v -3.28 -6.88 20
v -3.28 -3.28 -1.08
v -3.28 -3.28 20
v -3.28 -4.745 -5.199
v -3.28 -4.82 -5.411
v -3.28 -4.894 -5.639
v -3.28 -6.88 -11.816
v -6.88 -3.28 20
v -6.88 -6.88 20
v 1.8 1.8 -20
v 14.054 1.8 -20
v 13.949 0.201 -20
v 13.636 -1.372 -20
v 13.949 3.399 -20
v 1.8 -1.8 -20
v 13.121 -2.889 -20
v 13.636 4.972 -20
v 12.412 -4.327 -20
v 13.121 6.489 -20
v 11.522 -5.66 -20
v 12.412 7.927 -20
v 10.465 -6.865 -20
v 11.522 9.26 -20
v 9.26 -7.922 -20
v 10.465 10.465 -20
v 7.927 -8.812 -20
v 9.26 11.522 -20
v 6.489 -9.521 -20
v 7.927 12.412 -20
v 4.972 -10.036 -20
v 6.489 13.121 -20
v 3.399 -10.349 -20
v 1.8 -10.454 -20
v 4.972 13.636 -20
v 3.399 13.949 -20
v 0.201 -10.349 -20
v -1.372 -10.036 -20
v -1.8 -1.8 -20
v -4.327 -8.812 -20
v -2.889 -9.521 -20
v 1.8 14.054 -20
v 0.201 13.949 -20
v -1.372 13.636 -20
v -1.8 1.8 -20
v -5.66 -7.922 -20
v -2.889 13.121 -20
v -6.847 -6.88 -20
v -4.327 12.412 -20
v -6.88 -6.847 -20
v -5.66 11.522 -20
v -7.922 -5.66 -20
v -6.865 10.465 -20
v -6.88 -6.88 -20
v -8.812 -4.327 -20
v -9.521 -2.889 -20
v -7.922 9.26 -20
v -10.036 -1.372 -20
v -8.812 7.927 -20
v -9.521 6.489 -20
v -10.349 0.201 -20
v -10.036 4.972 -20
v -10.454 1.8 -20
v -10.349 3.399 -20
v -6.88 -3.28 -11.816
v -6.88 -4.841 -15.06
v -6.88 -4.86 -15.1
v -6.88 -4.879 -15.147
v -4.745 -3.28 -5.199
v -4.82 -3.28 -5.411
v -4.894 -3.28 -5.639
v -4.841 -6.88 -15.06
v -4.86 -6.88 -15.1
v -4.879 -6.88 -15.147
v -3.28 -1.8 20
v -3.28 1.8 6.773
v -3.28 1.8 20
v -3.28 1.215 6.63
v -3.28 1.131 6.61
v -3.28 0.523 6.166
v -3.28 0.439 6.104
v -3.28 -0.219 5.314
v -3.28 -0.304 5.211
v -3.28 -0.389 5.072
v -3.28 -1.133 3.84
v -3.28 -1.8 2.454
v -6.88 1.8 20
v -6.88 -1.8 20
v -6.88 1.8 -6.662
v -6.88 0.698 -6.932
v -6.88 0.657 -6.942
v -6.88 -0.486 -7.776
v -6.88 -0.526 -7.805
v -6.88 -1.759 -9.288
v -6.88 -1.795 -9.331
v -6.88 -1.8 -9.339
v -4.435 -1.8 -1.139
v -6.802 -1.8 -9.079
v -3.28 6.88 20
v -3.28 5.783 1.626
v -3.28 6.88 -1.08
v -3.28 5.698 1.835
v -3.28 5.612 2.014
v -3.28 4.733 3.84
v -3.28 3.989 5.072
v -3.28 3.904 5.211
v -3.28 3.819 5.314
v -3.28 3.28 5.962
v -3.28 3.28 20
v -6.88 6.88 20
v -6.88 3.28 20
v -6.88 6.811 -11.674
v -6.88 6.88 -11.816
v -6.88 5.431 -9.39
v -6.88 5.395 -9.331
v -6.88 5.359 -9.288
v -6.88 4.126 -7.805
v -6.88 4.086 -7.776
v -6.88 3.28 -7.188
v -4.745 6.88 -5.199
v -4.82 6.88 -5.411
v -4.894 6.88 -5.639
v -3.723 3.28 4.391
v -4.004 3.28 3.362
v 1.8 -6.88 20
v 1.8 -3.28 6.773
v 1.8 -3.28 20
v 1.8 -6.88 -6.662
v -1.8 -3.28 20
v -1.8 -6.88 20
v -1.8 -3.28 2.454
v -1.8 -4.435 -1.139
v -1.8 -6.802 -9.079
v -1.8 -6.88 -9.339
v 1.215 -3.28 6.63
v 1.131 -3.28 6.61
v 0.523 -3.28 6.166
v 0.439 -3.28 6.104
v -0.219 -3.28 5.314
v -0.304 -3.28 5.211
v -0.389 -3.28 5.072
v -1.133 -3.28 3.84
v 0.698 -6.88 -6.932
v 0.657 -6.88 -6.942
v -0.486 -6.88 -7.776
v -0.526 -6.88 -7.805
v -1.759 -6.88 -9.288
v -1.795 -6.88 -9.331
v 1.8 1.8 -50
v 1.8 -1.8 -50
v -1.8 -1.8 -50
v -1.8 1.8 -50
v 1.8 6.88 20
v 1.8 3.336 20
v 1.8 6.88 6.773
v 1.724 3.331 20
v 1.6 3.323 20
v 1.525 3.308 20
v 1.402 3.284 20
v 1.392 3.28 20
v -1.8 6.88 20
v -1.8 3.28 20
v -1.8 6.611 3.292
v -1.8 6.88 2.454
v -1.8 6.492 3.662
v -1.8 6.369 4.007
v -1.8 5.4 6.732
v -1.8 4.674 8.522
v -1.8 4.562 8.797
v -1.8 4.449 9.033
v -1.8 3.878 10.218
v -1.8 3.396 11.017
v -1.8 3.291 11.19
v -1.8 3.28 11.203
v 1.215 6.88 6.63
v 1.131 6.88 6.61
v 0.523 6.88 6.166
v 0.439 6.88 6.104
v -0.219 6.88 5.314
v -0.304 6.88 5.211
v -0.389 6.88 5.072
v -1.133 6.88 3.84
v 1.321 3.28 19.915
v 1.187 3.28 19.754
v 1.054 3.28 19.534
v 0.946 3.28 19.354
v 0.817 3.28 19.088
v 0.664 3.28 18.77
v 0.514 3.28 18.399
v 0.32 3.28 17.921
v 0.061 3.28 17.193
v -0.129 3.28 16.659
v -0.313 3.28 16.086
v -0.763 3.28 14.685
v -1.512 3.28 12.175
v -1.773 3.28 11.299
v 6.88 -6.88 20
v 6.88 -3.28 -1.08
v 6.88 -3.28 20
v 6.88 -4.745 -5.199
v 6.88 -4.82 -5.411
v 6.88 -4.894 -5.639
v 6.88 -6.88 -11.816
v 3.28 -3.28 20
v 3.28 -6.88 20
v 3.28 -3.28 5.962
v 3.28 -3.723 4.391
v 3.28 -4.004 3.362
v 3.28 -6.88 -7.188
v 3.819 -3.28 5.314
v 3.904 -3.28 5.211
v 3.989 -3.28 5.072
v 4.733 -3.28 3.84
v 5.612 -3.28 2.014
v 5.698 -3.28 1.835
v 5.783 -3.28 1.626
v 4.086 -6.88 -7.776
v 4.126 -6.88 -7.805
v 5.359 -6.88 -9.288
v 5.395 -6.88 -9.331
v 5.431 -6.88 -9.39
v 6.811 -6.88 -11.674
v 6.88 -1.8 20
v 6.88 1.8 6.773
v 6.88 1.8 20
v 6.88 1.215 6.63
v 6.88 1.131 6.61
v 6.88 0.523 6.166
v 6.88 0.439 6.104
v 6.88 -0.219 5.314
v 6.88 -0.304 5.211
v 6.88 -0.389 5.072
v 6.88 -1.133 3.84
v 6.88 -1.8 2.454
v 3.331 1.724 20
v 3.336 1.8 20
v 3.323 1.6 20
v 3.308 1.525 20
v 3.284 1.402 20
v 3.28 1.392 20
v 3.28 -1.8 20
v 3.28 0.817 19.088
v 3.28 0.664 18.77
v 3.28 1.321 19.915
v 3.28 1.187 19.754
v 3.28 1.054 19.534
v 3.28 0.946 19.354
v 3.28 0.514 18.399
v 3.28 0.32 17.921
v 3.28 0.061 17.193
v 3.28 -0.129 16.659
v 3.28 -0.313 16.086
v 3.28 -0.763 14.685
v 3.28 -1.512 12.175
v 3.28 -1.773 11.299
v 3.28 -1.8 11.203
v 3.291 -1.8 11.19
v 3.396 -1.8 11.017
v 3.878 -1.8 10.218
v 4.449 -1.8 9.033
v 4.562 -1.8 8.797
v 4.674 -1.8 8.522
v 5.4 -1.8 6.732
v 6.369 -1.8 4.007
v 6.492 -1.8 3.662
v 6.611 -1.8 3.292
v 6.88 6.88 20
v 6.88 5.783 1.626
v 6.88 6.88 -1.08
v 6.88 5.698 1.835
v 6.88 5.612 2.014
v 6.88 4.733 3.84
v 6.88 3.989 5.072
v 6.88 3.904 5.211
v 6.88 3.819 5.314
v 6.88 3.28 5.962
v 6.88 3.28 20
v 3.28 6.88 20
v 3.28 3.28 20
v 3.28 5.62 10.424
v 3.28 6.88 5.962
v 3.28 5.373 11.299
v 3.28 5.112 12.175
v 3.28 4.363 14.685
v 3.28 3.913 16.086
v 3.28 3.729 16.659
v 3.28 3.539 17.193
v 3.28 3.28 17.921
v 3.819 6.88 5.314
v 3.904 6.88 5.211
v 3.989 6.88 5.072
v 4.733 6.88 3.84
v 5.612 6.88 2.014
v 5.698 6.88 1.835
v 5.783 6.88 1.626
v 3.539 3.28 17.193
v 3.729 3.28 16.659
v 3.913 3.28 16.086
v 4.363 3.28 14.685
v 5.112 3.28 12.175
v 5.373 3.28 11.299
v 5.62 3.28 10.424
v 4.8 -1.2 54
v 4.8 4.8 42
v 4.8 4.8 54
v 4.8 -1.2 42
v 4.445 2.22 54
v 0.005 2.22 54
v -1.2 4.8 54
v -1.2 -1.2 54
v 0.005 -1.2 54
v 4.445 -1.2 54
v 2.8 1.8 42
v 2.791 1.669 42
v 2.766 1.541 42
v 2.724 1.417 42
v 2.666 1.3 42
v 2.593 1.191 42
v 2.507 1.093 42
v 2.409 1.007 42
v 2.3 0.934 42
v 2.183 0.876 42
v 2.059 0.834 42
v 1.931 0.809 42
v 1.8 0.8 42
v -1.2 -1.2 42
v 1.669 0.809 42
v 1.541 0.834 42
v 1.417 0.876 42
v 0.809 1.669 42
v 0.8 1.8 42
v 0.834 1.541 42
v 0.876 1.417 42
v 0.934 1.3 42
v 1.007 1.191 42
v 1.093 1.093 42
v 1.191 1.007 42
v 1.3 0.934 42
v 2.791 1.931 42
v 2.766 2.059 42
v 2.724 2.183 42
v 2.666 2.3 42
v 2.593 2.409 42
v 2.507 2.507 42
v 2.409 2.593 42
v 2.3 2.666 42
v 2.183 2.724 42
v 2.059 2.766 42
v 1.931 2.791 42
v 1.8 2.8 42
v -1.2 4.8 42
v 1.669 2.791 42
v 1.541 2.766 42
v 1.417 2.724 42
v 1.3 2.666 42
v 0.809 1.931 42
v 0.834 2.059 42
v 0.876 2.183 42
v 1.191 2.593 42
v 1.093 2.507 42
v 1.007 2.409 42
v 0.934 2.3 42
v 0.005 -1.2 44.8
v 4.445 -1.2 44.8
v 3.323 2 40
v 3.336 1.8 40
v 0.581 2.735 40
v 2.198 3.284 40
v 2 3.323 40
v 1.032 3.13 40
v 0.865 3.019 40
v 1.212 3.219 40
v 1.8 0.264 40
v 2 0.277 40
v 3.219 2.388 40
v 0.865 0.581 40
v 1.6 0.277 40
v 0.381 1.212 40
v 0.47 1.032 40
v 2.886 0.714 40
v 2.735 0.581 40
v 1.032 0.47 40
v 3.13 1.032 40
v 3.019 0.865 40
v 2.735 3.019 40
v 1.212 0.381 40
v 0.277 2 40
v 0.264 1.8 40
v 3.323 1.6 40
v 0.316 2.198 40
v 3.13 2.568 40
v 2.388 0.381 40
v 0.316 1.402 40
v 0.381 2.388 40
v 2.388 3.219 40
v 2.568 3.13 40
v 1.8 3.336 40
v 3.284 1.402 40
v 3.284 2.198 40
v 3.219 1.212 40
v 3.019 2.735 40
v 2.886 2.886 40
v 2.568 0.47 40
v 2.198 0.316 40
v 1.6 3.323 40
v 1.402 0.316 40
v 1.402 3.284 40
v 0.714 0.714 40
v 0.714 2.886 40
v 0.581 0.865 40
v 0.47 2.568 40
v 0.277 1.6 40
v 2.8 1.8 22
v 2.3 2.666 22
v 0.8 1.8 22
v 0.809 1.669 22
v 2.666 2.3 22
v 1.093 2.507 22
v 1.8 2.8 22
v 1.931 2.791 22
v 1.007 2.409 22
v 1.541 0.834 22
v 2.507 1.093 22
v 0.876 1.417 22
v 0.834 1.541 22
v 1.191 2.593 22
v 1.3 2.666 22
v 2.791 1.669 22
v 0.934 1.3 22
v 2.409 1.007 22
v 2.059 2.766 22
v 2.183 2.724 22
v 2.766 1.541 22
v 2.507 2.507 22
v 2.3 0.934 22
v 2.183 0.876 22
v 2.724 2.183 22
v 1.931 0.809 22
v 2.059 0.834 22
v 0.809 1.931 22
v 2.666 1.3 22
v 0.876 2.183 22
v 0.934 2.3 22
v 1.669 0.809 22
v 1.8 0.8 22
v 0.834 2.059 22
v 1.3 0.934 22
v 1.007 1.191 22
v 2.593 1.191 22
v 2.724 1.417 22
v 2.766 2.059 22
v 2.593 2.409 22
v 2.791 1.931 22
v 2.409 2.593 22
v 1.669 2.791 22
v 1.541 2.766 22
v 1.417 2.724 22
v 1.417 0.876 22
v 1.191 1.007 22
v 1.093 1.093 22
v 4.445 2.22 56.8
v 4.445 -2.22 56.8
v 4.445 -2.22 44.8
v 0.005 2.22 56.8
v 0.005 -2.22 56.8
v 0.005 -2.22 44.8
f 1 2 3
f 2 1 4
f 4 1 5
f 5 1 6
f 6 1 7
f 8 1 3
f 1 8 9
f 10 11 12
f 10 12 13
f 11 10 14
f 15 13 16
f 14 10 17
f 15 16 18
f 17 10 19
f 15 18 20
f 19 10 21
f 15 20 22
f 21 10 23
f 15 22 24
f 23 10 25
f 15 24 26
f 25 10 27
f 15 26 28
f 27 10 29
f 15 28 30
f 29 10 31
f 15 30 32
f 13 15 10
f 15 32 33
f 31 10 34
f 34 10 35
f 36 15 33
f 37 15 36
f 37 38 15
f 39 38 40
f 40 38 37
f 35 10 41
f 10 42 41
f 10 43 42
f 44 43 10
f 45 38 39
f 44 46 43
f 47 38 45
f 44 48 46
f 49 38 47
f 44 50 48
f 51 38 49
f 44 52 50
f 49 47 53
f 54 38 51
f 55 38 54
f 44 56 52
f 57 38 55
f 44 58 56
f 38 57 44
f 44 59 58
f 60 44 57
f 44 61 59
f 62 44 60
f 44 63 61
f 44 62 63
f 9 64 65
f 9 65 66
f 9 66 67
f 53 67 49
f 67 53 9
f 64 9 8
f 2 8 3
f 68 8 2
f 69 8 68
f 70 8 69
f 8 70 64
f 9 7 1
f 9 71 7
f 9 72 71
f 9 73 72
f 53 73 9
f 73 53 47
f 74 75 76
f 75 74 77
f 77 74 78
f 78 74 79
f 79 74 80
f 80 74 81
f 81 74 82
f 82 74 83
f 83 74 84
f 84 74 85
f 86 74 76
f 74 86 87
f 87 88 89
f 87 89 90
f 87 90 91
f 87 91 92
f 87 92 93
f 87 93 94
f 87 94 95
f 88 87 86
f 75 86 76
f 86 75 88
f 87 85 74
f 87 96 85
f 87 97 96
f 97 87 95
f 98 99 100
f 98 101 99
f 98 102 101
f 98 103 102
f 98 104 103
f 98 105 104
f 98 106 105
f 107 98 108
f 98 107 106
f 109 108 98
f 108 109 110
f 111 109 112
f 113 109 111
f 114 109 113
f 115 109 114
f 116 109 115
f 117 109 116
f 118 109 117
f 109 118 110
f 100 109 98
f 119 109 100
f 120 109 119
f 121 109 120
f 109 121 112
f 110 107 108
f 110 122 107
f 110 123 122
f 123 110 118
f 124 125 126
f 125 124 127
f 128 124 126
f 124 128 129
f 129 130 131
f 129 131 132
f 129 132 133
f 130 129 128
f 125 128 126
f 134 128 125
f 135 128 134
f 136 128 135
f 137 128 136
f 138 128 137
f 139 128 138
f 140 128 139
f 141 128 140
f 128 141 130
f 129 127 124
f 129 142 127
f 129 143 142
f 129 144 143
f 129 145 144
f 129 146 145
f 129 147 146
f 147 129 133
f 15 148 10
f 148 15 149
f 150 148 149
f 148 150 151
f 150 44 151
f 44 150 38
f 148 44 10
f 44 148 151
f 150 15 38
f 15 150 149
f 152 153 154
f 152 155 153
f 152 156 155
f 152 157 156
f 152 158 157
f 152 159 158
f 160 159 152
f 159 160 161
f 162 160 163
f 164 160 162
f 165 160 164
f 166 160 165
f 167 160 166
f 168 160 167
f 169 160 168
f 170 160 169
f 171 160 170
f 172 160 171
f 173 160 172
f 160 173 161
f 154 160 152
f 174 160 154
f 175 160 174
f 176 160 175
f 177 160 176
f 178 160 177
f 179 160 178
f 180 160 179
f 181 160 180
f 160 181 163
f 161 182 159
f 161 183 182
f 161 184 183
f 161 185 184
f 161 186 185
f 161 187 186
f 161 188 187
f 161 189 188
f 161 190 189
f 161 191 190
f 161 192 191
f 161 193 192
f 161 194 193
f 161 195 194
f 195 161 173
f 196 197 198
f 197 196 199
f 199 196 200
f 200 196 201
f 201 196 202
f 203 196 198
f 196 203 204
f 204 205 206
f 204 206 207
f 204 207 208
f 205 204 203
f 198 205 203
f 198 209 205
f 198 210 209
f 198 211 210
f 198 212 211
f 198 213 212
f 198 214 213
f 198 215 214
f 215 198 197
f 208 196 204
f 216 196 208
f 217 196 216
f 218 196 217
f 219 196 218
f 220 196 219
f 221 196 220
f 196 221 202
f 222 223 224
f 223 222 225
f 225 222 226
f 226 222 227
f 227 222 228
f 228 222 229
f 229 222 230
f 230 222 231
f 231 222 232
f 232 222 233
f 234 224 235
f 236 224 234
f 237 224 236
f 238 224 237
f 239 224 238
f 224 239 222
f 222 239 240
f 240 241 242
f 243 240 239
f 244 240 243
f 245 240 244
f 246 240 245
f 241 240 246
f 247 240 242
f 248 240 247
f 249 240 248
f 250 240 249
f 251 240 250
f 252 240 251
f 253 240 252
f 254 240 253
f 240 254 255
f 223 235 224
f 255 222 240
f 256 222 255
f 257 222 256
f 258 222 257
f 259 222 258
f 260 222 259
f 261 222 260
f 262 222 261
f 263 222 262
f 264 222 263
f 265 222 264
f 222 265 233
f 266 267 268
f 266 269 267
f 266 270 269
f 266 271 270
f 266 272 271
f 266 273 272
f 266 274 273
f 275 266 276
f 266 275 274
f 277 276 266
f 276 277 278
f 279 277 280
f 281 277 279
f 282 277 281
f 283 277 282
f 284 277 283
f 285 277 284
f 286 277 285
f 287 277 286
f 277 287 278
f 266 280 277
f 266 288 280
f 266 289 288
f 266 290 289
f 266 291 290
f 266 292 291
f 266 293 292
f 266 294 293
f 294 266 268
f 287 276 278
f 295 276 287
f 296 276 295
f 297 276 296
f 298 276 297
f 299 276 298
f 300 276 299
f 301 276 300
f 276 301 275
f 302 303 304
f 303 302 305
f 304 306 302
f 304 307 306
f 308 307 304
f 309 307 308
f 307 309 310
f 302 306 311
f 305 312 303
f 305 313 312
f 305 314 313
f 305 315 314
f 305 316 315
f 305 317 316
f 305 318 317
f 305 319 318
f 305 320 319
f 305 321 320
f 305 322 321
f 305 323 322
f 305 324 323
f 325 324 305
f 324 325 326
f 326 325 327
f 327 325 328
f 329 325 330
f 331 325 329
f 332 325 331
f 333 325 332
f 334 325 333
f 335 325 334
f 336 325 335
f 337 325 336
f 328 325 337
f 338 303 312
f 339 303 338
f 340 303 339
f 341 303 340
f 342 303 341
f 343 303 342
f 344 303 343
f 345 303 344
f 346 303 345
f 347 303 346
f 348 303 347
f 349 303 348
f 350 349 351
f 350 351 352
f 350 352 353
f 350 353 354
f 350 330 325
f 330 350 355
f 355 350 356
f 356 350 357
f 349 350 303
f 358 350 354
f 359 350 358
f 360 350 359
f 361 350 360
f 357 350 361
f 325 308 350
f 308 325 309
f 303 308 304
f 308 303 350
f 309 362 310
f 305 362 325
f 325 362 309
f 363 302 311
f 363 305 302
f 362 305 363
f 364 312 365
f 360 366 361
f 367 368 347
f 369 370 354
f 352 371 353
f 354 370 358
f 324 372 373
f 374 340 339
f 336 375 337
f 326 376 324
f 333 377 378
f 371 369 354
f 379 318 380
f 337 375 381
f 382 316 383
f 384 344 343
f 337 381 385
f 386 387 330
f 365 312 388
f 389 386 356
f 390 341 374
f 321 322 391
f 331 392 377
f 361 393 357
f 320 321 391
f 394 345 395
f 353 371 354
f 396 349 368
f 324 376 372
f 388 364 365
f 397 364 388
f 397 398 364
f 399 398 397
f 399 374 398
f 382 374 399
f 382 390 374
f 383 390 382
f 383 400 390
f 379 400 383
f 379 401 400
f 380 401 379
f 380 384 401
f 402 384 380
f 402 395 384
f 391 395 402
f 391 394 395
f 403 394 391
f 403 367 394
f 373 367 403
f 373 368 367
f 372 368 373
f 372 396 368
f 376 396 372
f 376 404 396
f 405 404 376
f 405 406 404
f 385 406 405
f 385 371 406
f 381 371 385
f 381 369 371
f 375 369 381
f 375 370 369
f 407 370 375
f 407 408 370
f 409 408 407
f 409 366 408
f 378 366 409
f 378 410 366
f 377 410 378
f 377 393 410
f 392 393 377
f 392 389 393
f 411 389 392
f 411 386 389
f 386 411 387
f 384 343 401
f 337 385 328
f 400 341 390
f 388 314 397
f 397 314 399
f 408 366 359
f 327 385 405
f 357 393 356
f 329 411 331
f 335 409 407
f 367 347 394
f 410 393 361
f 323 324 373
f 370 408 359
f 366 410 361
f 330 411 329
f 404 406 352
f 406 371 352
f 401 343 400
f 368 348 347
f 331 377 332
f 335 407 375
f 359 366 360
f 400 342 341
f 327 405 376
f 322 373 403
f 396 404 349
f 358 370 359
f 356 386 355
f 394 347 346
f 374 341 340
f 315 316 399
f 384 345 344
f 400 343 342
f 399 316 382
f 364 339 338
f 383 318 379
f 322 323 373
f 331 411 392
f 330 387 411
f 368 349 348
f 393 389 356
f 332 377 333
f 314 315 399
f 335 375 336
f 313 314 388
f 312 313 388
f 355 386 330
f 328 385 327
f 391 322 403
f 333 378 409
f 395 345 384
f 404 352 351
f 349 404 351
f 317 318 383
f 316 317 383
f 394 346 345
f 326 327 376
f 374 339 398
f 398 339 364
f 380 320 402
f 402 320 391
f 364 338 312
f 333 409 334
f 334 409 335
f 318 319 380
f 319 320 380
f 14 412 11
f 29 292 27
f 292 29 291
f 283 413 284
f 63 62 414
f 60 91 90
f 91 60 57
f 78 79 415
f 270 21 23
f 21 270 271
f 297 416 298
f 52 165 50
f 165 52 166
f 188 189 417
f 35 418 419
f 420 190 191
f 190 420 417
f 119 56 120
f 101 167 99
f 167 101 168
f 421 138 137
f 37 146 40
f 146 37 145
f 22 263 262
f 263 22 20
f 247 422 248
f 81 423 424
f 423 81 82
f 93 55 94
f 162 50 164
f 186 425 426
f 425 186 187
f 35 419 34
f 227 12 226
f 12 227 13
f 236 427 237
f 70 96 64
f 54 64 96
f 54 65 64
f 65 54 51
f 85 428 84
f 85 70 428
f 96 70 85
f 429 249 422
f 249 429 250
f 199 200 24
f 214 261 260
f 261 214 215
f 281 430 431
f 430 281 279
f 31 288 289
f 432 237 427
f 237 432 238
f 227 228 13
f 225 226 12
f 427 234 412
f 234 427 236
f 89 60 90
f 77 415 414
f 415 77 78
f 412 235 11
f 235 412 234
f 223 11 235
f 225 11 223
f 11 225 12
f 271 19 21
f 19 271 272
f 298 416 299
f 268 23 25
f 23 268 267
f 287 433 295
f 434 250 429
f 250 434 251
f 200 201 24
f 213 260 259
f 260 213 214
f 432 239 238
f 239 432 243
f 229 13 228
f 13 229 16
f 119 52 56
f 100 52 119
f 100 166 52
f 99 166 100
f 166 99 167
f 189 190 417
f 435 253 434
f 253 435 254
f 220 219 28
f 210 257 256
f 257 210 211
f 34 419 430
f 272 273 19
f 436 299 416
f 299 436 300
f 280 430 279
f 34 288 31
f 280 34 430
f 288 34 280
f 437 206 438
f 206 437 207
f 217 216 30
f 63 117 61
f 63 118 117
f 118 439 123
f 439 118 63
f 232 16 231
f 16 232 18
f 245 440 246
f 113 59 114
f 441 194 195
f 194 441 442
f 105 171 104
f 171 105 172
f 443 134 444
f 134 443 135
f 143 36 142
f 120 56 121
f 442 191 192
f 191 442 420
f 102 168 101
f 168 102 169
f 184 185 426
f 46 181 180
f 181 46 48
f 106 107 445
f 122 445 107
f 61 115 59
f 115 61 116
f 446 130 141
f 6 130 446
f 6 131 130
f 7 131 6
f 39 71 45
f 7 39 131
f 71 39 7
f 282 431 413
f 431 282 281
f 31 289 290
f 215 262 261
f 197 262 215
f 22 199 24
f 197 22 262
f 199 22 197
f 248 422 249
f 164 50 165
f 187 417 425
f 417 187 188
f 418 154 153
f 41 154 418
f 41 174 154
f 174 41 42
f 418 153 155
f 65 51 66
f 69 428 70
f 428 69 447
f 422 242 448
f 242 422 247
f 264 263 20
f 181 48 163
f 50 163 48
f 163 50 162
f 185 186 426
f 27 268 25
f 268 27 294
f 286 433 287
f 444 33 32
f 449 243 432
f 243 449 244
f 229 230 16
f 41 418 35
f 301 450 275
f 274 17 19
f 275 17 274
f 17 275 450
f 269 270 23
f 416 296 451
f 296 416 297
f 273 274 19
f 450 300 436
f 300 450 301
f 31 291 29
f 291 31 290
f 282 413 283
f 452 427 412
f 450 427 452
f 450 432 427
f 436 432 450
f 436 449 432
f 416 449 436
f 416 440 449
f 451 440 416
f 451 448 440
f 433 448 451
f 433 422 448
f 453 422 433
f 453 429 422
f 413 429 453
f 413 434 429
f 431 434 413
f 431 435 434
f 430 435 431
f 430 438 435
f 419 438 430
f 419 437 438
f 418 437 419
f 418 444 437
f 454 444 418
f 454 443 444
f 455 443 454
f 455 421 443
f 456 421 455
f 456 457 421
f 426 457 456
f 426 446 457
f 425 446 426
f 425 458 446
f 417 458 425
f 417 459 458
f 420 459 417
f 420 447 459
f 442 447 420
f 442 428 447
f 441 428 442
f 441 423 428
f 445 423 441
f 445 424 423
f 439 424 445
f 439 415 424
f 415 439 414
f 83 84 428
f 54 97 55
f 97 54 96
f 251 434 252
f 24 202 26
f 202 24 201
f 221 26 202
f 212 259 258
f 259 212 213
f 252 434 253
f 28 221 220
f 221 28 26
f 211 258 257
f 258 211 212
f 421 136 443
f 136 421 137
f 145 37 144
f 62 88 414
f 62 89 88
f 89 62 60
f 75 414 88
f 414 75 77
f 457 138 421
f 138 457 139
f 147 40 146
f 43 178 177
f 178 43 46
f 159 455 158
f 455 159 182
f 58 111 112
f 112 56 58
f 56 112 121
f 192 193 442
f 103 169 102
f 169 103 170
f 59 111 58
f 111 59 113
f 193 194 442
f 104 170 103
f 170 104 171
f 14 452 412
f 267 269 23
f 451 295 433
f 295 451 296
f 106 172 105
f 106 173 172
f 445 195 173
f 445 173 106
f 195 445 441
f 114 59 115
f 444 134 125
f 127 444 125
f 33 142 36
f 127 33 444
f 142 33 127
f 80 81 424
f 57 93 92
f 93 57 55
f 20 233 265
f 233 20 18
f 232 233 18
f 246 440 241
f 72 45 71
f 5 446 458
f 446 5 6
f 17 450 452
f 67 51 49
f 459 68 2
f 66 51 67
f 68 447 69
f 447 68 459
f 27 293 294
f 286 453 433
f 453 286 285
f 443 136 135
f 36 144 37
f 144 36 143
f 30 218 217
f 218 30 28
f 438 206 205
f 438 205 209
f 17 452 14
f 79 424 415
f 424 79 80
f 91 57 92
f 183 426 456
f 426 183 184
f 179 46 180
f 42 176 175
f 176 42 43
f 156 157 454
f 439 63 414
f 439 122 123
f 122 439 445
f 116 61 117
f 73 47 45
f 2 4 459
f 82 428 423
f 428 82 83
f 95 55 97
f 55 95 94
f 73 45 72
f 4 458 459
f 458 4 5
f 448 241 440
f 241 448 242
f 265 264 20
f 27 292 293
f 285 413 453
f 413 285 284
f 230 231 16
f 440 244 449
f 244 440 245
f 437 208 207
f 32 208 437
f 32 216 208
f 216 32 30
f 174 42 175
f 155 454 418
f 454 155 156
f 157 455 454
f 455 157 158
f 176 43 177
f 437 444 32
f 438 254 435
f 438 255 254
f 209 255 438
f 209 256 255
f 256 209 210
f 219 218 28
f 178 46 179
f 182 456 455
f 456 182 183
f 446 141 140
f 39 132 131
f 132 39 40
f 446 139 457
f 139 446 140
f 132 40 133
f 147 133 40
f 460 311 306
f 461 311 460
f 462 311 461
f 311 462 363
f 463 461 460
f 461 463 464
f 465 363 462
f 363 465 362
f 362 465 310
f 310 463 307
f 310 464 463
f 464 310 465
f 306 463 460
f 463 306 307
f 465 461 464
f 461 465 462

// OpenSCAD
// DND-111 + DND-113 — A1 reader-head optical geometry at the 5.08 mm pitch
// (real OpenSCAD)
//
// Bounds the SINGLE-CELL READ RESOLUTION question from CAD + geometry:
// can one wrong cell among 6,400 be distinguished from its neighbours?
//
// DND-113 CORRECTION (from the DND-112 audit). The reader head sits above the
// column tops at a working gap g. A single interrogation aperture of diameter
// d emits at half-angle theta. DND-111 computed ONE spot at ONE 2 mm gap and
// called it "the single-cell read". That is the UP-state spot only: the A1
// state is the column-top HEIGHT, so over a DOWN cell the reflective target is
// TRAVEL = 40 mm lower and the interrogated gap is ~42 mm, giving a ~24.5 mm
// spot (4.82 pitches). At that standoff the four up neighbours dominate the
// pocket return by ~441x, so a down cell reads UP — a silent wrong-cell
// failure. The read is NOT single-cell for the down half of the states, and
// the binding limit is the STATE-DEPENDENT STANDOFF, not a gantry registration
// tolerance.
//
// This file renders the worst case (aperture centred on a CELL CORNER) and
// echoes both states so the defect is visible in the render record. It also
// models the DND-113 PROPOSED fix: a reflective flag on the frame-anchored
// latch hinge, read at ONE standoff for both states (a common-height target).
//
// EVIDENCE CLASS: CAD geometry only. No print, no measurement (DND-27).
//
// Geometry from the placed cell CAD (a1_binary_latch_cell.scad):
//   PITCH = 5.08, BODY (column top face) = 3.60, lane = 0.74 each side.

PITCH      = 5.08;
BODY       = 3.60;         // column top face (square)
TRAVEL     = 40.0;         // column top at full up = 40 mm
OWNED_LANE = PITCH/2 - BODY/2;   // 0.74 mm

WORK_GAP   = 2.0;          // reader-to-UP-top working gap (assumption-class)
APERTURE   = 2.0;          // single-cell interrogation aperture (assumption-class)
HALF_ANGLE = 15.0;         // emission half-angle (deg)
$fn = 48;

// Spot diameter where the center ray meets the target plane:
//   spot = aperture + 2 * gap * tan(half_angle)
function spot_d(gap, d, ha) = d + 2*gap*tan(ha);
SPOT_UP   = spot_d(WORK_GAP, APERTURE, HALF_ANGLE);
SPOT_DOWN = spot_d(WORK_GAP + TRAVEL, APERTURE, HALF_ANGLE);

// DND-113: the true worst-case reach is with the aperture genuinely at the CELL
// CORNER. The farthest spot point from the cell centre is the corner radius
// sqrt((BODY/2)^2 + (BODY/2)^2) plus the spot radius. DND-111's
// `spot/2*sqrt(2)` was a CENTRED aperture with a diagonal spot and understated
// the reach by ~1.9 mm.
CORNER_HYP   = sqrt((BODY/2)*(BODY/2) + (BODY/2)*(BODY/2));   // 2.546 mm
CORNER_REACH = CORNER_HYP + SPOT_UP/2;                         // 4.081 mm

// DND-113: the physical crosstalk threshold is the NEIGHBOUR's near edge, not
// the own top-face edge (DND-112 R3).
NEIGHBOUR_NEAR_EDGE = PITCH - BODY/2;                          // 3.28 mm
SPOT_CONTAMINATES = SPOT_UP/2 > NEIGHBOUR_NEAR_EDGE;

module column_up() {
    color("SteelBlue")
        translate([0, 0, TRAVEL/2 - 20])
            cube([BODY, BODY, TRAVEL], center=true);
}

module column_down() {
    color("DimGray")
        translate([0, 0, -10 - 20])
            cube([BODY, BODY, TRAVEL], center=true);
}

module reader_head() {
    // the reader head body (orange) with the interrogation aperture (yellow)
    translate([0, 0, TRAVEL + WORK_GAP + 6])
        color("Orange") cube([APERTURE + 4, APERTURE + 4, 12], center=true);
    // the cone from the aperture to the UP target top face (green: fits)
    translate([0, 0, TRAVEL + WORK_GAP/2])
        color("Gold", 0.35)
            cylinder(h = WORK_GAP, d1 = SPOT_UP, d2 = APERTURE, center=true);
}

module down_state_cone() {
    // DND-113: the same aperture aimed 40 mm lower over a DOWN cell. The
    // resulting cone is a ~24.5 mm spot that covers the whole 3x3 patch — the
    // silent-crosstalk failure the audit found.
    translate([0, 0, WORK_GAP/2])
        color("Red", 0.22)
            cylinder(h = WORK_GAP + TRAVEL, d1 = SPOT_DOWN, d2 = APERTURE,
                     center=true);
}

module neighbour_patch() {
    // a 3x3 patch with the CENTRE cell DOWN (the wrong cell) and neighbours UP
    for (i = [-1, 0, 1])
        for (j = [-1, 0, 1]) {
            x = i*PITCH; y = j*PITCH;
            if (i == 0 && j == 0) translate([x, y, 0]) column_down();
            else translate([x, y, 0]) column_up();
        }
}

module common_height_flag() {
    // DND-113 PROPOSED fix: a reflective flag on the frame-anchored latch hinge,
    // read at ONE standoff for both states.
    // ---------------------------------------------------------------------
    // DND-114 STATUS: this is now a VALIDATED-ARTIFACT read target, not a
    // schematic. The flag is the CH-A frame-fixed vane from
    // `a1_binary_latch_cell.scad`: a post in the latch lane with its top face
    // at a single fixed z for both column states (DeltaZ = 0 by construction).
    // The reader rides at a FIXED standoff above the flag plane; the neighbour
    // columns sit at x >= PITCH - BODY/2, so only the X half-width of the spot
    // can reach them. See the self-checks below.
    translate([FLAG_X, 0, FLAG_Z_TOP - FLAG_H/2])
        color("Gold") cube([FLAG_T, FLAG_W, FLAG_H], center=true);
    translate([FLAG_X, 0, FLAG_Z_TOP + 0.01])
        color("Khaki") cube([FLAG_T, FLAG_W, 0.02], center=true);
}

module flag_reader_head() {
    // DND-114: the reader head fixed above the flag plane at ONE standoff.
    // A dedicated SMALL aperture (FLAG_AP=0.60 mm) and tight standoff
    // (FLAG_GAP=1.0 mm) keep the spot off the neighbour body; the spot may
    // spread in Y because the lane is open across the full pitch.
    translate([FLAG_X, 0, FLAG_Z_TOP + FLAG_GAP + 6])
        color("Orange") cube([FLAG_AP + 4, FLAG_AP + 4, 12], center=true);
    // cone from the aperture to the frame-fixed flag top face (green: fits)
    translate([FLAG_X, 0, FLAG_Z_TOP + FLAG_GAP/2])
        color("LimeGreen", 0.30)
            cylinder(h = FLAG_GAP,
                     d1 = FLAG_AP + 2*FLAG_GAP*tan(HALF_ANGLE),
                     d2 = FLAG_AP, center=true);
}

module assembly() {
    neighbour_patch();
    // aperture centred over the CENTRE cell corner (worst-case straddle)
    translate([BODY/2, BODY/2, 0]) {
        reader_head();
        down_state_cone();
    }
    // DND-114: the common-height flag target read at its own fixed standoff.
    common_height_flag();
    translate([0, 0, 0]) flag_reader_head();
}

assembly();

// ---- self-checks (echoed, captured by the render tool) ---------------------
echo(str("PITCH=", PITCH, " BODY=", BODY, " OWNED_LANE=", OWNED_LANE));
echo(str("WORK_GAP=", WORK_GAP, " APERTURE=", APERTURE, " HALF_ANGLE=", HALF_ANGLE));
echo(str("SPOT_UP_diameter=", SPOT_UP));
echo(str("SPOT_DOWN_diameter=", SPOT_DOWN, " = ", SPOT_DOWN/PITCH, " pitches"));
echo(str("CORNER_HYP=", CORNER_HYP, " CORNER_REACH_corrected=", CORNER_REACH));
echo(str("NEIGHBOUR_NEAR_EDGE=", NEIGHBOUR_NEAR_EDGE, " SPOT_CONTAMINATES=", SPOT_CONTAMINATES));
echo(str("spot fits top face at centre: ", (SPOT_UP/2) <= BODY/2));
echo(str("down-state single-cell read resolvable: ", SPOT_DOWN <= BODY));
echo(str("gap for centre fit: ", (BODY - APERTURE)/(2*tan(HALF_ANGLE))));

// ---- DND-114 common-height target read self-checks -------------------------
FLAG_X       = BODY/2 + 0.45/2 + 0.20;     // HINGE_X, frame-fixed lane
FLAG_T       = 0.44;                       // flag width in X
FLAG_W       = 1.60;                       // flag width in Y
FLAG_H       = 0.80;
FLAG_Z_TOP   = TRAVEL + 3.0;               // fixed target top face z
// DND-115 REVISION: the shutter flap needs a tolerance-robust window between the
// vane top and the reader aperture plane, so the fixed standoff is raised
// 1.0 -> 1.8 mm and the aperture is set to 0.44 mm (1 line).
FLAG_GAP     = 1.8;                        // fixed reader-to-flag standoff
FLAG_AP      = 0.44;                       // dedicated small flag-read aperture
FLAG_SPOT_X  = FLAG_AP + 2*FLAG_GAP*tan(HALF_ANGLE);  // spot width in X = 1.405
FLAG_SPOT_Y  = FLAG_SPOT_X;                // same formula, Y is open
X_CLEAR_NB   = PITCH - BODY/2 - FLAG_X;    // to the neighbour body
FLAG_SPOT_CLEARS_NB = (FLAG_SPOT_X/2) <= X_CLEAR_NB;
FLAG_SPOT_FITS_Y    = FLAG_SPOT_X <= FLAG_W;
echo(str("FLAG_X=", FLAG_X, " Z_FLAG_TOP=", FLAG_Z_TOP,
         " (frame-fixed; DeltaZ=0 for both states)"));
echo(str("FLAG_GAP=", FLAG_GAP, " FLAG_AP=", FLAG_AP,
         " FLAG_SPOT_X=", FLAG_SPOT_X, " X_CLEAR_NB=", X_CLEAR_NB));
echo(str("flag spot clears neighbour body: ", FLAG_SPOT_CLEARS_NB));
echo(str("flag spot fits flag Y width: ", FLAG_SPOT_FITS_Y));
